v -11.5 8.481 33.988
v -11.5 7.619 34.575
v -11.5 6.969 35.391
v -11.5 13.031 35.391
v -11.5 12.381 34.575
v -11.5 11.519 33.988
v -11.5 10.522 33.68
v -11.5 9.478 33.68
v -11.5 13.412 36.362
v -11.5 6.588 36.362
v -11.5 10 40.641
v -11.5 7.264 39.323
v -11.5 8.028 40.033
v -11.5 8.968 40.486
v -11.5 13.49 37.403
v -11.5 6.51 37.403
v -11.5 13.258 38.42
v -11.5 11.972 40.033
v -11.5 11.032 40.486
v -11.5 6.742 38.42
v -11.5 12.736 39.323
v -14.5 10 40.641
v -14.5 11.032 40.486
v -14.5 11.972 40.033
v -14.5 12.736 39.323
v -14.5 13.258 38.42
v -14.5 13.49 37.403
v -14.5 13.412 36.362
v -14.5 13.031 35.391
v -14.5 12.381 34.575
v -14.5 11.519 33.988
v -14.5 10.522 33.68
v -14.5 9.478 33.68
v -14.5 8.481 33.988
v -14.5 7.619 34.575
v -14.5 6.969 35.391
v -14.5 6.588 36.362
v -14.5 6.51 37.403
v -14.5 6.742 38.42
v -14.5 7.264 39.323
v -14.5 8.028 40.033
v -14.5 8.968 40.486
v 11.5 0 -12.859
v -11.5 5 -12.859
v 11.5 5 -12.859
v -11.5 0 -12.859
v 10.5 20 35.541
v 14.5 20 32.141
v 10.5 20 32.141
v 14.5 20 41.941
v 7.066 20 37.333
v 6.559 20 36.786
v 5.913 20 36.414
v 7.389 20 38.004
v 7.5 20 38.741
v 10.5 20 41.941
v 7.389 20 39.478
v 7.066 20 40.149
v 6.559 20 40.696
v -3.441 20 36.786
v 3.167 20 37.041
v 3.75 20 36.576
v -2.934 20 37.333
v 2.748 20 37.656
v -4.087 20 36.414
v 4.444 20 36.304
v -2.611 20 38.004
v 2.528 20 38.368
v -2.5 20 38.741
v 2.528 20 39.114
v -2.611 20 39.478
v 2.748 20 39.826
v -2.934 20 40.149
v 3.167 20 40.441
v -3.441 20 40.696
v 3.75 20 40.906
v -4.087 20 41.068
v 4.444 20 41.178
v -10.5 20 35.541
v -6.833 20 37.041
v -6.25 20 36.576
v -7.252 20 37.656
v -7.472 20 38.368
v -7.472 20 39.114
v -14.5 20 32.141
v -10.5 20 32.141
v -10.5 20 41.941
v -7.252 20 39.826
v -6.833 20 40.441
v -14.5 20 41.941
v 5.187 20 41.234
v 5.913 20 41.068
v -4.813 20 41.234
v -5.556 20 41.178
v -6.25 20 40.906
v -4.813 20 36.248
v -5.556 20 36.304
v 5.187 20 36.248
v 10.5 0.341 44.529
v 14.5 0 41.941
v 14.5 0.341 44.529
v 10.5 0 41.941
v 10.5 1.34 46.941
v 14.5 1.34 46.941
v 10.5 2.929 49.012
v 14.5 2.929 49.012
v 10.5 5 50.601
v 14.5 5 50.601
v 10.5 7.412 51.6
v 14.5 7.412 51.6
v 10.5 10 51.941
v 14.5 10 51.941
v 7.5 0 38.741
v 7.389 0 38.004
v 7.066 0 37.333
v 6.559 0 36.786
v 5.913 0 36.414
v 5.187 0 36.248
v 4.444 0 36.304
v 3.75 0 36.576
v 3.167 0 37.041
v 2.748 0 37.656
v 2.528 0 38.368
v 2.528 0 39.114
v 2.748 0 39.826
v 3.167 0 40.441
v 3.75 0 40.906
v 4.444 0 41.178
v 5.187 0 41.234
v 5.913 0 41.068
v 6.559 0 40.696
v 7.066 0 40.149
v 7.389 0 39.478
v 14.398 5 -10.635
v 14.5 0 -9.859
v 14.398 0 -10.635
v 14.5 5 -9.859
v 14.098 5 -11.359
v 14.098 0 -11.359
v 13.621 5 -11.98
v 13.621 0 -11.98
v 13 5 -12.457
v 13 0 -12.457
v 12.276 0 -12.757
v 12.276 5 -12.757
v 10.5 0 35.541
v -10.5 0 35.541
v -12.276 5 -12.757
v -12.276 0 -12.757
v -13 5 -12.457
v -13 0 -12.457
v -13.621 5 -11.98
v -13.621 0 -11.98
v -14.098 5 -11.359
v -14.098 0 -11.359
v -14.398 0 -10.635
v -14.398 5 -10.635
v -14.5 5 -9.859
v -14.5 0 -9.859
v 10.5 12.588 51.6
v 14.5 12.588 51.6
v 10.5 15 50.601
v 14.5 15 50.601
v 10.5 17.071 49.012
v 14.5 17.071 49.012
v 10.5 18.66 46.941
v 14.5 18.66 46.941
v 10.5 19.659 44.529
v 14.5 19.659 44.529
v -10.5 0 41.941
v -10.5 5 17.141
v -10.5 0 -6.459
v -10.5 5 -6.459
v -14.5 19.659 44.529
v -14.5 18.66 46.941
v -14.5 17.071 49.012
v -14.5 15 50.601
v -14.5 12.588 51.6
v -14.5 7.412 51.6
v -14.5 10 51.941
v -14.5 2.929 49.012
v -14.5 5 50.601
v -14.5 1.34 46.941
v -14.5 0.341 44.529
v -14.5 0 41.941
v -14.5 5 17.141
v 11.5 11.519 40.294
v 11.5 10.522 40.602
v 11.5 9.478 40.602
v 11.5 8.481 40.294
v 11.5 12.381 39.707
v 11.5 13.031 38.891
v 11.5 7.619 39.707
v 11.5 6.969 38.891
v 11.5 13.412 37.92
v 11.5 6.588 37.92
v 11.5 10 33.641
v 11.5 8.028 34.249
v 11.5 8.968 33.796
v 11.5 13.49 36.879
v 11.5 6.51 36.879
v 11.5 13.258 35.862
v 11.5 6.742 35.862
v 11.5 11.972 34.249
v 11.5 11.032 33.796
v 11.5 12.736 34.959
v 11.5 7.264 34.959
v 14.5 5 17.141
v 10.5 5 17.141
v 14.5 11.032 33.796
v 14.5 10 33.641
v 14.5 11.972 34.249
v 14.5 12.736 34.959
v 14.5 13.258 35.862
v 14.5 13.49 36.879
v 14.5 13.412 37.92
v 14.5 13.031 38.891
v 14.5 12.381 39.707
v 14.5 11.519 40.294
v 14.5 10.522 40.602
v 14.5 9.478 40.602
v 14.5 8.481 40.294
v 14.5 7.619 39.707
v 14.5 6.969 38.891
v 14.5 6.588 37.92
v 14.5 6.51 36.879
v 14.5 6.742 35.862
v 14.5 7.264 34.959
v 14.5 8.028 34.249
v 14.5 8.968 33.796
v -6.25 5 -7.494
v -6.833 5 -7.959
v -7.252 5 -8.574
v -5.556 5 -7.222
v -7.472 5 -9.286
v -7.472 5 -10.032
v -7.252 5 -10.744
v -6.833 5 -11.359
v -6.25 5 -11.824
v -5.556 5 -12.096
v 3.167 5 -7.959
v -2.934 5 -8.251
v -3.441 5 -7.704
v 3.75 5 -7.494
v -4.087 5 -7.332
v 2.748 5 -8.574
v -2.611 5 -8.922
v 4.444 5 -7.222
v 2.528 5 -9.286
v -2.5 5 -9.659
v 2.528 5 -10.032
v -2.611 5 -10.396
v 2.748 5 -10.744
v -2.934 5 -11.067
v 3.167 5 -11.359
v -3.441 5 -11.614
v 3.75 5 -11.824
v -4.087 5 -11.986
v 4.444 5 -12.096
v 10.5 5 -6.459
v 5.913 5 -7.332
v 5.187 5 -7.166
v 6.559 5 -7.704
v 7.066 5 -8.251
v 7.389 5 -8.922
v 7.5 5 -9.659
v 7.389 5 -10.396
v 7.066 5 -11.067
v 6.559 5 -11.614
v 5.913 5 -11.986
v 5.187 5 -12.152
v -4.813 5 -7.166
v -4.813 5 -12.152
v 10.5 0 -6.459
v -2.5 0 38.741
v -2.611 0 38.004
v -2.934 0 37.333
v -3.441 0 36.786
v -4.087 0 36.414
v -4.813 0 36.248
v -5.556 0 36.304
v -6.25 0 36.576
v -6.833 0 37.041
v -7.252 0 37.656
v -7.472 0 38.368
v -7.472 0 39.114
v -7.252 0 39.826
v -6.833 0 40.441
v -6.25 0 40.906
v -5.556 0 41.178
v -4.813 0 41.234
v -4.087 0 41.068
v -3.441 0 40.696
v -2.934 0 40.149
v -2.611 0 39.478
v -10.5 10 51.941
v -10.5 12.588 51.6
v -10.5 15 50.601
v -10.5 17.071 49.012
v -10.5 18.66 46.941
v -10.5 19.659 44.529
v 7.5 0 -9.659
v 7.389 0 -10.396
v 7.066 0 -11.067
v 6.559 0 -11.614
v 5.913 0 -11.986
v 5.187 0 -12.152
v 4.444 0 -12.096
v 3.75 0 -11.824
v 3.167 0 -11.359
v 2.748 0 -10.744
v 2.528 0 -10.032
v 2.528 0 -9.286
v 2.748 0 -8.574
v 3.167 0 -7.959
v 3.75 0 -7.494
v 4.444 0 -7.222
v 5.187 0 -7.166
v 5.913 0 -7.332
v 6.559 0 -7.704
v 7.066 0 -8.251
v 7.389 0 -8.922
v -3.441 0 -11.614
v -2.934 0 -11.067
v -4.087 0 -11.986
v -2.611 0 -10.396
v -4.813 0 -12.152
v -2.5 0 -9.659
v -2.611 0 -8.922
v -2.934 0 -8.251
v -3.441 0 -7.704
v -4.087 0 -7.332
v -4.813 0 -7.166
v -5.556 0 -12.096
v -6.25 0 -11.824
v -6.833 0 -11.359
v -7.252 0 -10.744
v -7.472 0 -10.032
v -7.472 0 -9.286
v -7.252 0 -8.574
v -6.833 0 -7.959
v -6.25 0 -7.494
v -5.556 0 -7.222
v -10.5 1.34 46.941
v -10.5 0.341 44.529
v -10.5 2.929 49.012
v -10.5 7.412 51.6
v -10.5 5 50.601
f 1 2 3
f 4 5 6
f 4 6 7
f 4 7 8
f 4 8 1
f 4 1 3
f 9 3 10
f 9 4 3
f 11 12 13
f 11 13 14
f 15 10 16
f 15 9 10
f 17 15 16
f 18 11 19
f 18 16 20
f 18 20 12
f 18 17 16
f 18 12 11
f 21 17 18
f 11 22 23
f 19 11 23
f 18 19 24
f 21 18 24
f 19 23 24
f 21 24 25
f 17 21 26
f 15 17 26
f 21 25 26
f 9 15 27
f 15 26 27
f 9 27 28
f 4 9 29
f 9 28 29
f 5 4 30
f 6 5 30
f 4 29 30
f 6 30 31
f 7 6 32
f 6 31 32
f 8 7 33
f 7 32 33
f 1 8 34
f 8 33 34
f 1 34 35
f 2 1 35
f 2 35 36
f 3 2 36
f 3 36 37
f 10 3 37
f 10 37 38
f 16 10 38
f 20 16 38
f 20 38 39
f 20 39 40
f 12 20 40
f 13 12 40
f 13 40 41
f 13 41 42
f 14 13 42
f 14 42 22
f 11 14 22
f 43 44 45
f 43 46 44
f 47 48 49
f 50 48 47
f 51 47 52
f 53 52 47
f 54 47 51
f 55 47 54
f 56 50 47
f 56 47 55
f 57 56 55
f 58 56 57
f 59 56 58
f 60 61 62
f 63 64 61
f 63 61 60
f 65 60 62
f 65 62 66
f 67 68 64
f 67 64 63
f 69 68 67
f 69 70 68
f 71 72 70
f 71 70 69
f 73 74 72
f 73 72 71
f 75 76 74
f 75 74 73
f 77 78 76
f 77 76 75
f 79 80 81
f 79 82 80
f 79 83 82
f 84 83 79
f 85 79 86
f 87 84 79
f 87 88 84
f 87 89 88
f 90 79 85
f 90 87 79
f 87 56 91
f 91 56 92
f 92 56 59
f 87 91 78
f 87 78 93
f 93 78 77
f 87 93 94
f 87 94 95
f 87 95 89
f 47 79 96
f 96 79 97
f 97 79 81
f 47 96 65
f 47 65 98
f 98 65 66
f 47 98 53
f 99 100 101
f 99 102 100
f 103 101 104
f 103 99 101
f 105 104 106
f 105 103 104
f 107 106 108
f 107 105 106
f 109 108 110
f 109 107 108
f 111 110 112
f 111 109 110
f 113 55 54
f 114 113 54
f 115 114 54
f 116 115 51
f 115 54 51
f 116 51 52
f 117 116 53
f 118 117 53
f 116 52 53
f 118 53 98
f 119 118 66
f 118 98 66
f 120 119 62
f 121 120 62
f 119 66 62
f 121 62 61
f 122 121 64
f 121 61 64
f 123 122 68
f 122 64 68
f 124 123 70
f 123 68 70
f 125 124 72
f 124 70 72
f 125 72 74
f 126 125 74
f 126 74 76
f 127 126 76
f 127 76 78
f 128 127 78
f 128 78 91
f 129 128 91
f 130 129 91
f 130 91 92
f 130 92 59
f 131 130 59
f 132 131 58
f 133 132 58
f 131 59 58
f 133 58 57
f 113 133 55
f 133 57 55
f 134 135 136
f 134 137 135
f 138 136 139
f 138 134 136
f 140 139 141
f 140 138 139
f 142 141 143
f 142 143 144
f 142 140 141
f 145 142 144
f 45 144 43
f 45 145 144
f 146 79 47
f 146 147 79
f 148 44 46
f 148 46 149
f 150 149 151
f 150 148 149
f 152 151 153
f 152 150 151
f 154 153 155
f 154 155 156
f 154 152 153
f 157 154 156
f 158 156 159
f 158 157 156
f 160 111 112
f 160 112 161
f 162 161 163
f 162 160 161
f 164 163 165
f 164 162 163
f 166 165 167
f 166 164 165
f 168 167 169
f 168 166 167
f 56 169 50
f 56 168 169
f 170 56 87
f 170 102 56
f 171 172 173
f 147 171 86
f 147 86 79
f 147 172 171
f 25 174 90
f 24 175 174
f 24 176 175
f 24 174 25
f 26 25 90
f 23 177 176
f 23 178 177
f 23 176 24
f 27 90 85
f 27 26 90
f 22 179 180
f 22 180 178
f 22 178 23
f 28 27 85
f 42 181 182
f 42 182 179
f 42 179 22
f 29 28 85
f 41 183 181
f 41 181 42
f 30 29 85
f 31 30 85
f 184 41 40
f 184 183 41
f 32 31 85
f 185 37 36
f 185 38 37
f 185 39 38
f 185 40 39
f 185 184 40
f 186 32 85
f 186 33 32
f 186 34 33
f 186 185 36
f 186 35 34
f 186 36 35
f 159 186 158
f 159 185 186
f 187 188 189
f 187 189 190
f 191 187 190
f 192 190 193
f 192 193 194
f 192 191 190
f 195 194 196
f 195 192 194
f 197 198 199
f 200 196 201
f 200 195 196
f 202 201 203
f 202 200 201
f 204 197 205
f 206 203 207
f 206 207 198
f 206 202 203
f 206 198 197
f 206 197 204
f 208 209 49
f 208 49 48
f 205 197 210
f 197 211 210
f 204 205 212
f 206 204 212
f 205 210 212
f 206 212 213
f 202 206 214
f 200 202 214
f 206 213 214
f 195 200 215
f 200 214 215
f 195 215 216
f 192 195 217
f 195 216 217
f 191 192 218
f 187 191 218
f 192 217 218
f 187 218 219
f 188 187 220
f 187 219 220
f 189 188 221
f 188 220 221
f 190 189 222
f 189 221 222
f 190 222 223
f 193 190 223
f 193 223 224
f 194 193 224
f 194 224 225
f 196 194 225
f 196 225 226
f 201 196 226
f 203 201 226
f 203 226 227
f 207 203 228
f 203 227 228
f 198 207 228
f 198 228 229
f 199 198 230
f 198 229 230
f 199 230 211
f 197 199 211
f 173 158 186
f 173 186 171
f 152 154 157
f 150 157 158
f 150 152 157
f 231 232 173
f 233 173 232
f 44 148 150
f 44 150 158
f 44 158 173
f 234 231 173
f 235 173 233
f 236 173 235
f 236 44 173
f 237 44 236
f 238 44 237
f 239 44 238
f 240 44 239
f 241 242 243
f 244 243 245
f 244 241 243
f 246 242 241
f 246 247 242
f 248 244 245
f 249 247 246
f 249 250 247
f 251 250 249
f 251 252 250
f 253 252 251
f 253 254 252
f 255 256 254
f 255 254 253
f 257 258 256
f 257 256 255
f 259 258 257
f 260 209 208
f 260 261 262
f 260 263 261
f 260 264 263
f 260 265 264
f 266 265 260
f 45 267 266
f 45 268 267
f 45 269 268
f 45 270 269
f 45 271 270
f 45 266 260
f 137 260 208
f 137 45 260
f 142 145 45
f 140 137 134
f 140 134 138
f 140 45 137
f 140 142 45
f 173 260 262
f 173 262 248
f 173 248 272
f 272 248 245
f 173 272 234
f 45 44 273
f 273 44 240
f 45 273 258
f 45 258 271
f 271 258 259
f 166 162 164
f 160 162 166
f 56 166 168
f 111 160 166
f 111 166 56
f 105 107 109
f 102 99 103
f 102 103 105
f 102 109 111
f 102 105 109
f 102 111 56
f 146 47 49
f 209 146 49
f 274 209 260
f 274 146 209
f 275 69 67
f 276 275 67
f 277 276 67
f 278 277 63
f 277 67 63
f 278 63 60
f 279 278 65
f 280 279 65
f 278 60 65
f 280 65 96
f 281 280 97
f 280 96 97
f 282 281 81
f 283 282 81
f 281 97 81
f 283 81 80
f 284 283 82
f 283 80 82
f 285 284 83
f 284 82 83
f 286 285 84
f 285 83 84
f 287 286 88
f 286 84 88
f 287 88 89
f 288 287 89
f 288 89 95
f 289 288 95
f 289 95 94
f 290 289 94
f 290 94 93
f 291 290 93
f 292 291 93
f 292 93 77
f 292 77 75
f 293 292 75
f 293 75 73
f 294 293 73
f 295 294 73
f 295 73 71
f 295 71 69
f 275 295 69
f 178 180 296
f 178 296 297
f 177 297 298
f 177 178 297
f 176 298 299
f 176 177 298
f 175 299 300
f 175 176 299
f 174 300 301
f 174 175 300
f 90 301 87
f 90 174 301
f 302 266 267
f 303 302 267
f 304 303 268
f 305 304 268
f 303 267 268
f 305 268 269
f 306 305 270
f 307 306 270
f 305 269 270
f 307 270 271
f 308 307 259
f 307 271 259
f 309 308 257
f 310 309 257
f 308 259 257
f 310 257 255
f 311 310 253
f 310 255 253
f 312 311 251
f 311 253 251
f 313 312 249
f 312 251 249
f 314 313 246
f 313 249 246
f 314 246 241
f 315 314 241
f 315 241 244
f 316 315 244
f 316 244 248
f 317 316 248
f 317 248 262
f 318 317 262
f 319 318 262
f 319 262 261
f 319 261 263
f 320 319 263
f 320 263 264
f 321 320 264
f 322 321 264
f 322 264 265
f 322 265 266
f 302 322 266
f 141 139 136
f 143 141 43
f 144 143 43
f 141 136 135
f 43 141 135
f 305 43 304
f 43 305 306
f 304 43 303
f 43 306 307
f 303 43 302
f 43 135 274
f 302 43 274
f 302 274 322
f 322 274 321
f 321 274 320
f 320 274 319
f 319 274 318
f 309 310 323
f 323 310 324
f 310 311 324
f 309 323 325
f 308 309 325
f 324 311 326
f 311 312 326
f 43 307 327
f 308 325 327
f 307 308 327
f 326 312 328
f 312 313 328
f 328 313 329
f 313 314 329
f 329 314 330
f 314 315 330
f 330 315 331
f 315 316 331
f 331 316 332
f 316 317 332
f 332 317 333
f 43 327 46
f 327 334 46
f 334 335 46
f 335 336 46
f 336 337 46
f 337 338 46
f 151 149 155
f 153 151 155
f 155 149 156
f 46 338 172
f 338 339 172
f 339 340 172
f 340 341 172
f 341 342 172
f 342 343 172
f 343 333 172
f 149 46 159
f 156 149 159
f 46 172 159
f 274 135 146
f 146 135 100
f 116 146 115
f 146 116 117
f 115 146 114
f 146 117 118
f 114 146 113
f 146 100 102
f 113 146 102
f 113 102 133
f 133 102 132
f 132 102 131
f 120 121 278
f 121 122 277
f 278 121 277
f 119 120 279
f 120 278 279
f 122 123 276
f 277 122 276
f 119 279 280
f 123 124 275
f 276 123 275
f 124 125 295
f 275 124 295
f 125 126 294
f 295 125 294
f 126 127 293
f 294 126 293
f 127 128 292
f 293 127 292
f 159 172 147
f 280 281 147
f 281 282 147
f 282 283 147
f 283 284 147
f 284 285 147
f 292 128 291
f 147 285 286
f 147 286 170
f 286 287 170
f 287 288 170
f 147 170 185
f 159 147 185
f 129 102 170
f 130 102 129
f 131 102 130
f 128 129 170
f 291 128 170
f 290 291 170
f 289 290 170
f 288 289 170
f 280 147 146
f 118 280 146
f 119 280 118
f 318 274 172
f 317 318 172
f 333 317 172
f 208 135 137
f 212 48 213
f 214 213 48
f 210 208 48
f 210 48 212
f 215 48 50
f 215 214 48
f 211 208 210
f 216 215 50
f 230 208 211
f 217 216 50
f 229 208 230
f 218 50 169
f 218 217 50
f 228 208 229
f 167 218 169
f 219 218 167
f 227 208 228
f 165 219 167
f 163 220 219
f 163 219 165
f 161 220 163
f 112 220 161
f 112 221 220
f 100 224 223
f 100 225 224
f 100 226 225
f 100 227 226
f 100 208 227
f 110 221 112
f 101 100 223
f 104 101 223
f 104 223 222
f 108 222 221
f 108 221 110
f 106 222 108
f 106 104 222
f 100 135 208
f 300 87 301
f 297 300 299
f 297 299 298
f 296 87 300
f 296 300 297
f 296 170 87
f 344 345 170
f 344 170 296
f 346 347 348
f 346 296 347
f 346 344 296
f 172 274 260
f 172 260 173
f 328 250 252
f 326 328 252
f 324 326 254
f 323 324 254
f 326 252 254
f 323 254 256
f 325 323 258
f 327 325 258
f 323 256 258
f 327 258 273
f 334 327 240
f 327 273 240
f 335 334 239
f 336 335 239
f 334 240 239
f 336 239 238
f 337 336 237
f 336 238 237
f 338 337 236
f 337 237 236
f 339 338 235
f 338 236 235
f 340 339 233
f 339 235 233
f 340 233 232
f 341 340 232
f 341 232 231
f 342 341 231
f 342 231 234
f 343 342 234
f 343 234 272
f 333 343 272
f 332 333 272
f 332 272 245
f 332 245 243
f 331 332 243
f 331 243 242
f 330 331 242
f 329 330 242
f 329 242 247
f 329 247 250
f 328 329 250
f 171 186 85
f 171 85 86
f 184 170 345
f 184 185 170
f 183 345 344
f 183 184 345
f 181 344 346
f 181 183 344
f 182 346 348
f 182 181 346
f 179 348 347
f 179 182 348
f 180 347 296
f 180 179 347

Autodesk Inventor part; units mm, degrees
ref_plane "YZ Plane" through (0, 0, 0) normal (1, 0, 0) x (0, 1, 0)
ref_plane "XZ Plane" through (0, 0, 0) normal (0, 1, 0) x (-1, 0, 0)
ref_plane "XY Plane" through (0, 0, 0) normal (0, 0, 1) x (1, 0, 0)
sketch "Esquisse1" plane through (0, 0, 0) normal (0, 1, 0) x (-1, 0, 0)
  line L0 (-14.5, 51.941) -> (-10.5, 51.941)
  line L1 (-10.5, 51.941) -> (-10.5, -12.859)
  line L2 (-10.5, -12.859) -> (-14.5, -12.859)
  line L3 (-14.5, -12.859) -> (-14.5, 51.941)
  line L4 (10.5, 51.941) -> (14.5, 51.941)
  line L5 (14.5, 51.941) -> (14.5, -12.859)
  line L6 (14.5, -12.859) -> (10.5, -12.859)
  line L7 (10.5, -12.859) -> (10.5, 51.941)
  line L8 (-10.5, -6.459) -> (10.5, -6.459)
  line L9 (10.5, -6.459) -> (10.5, -12.859)
  line L10 (10.5, -12.859) -> (-10.5, -12.859)
  line L11 (-10.5, -12.859) -> (-10.5, -6.459)
  line L12 (-10.5, 41.941) -> (10.5, 41.941)
  line L13 (10.5, 41.941) -> (10.5, 35.541)
  line L14 (10.5, 35.541) -> (-10.5, 35.541)
  line L15 (-10.5, 35.541) -> (-10.5, 41.941)
  line L16 (10.5, -12.859) -> (14.5, -12.859)
  point P0 (0, 0)
  dimension "d1" = 6.4
  dimension "d2" = 21
  dimension "d3" = 4
  dimension "d4" = 4
  dimension "d5" = 10.5
  dimension "d6" = 42
  dimension "d7" = 10
  dimension "d8" = 35.541
  dimension "d9" = 6.4
extrude "Extrusion1" add sketch "Esquisse1" along normal blind 20 contours L0 L1 L2 L3 | L12 L7 L14 L1 | L1 L8 L7 L10 | L7 L4 L5 L6
sketch "Esquisse2" plane through (14.5, 0, 51.941) normal (1, 0, 0) x (0, 0, -1)
  line L0 (64.8, 0) -> (64.8, 20) projected
  line L1 (0, 0) -> (0, 20) projected
  line L2 (0, 10) -> (64.8, 10) construction
  circle A0 centre (14.8, 10) radius 3.5
  point P0 (51.941, 0)
  dimension "d12" = 50
  dimension "d13" = 7
extrude "Extrusion2" cut sketch "Esquisse2" against normal blind 3
sketch "Esquisse3" plane through (-14.5, 0, -12.859) normal (-1, 0, 0) x (0, 0, 1)
  line L0 (64.8, 0) -> (64.8, 20) projected
  line L1 (0, 0) -> (0, 20) projected
  line L2 (64.8, 10) -> (0, 10) construction
  circle A0 centre (50, 10) radius 3.5
  point P0 (12.859, 0)
  dimension "d16" = 50
  dimension "d17" = 7
extrude "Extrusion3" cut sketch "Esquisse3" against normal blind 3
sketch "Esquisse5" plane through (0, 20, 0) normal (0, 1, 0) x (1, 0, 0)
  line L0 (10.5, -35.541) -> (-10.5, -35.541) projected
  line L1 (14.5, 12.859) -> (-14.5, 12.859) projected
  line L2 (-10.5, -41.941) -> (10.5, -41.941) projected
  line L3 (-9.9, 12.859) -> (9.9, 12.859)
  line L4 (9.9, 12.859) -> (9.9, 6.459)
  line L5 (9.9, 6.459) -> (-9.9, 6.459)
  line L6 (-9.9, 6.459) -> (-9.9, 12.859)
  line L7 (-9.9, -41.941) -> (9.9, -41.941)
  line L8 (9.9, -41.941) -> (9.9, -35.541)
  line L9 (9.9, -35.541) -> (-9.9, -35.541)
  line L10 (-9.9, -35.541) -> (-9.9, -41.941)
  line L11 (0, 12.859) -> (0, -41.941)
  circle A0 centre (5, 9.659) radius 2.5
  circle A1 centre (5, -38.741) radius 2.5
  circle A2 centre (-5, 9.659) radius 2.5
  circle A3 centre (-5, -38.741) radius 2.5
  point P0 (0, 0)
  dimension "d29" = 6.4
  dimension "d30" = 6.4
  dimension "d31" = 19.8
  dimension "d32" = 9.9
  dimension "d33" = 5
  dimension "d34" = 5
  dimension "d35" = 5
  dimension "d36" = 5
  dimension "d37" = 3.2
  dimension "d38" = 3.2
extrude "Extrusion5" cut sketch "Esquisse5" against normal through all contours A0 | A1 | A2 | A3
sketch "Esquisse6" plane through (0, 20, 0) normal (0, 1, 0) x (1, 0, 0)
  circle A0 centre (-5, 9.659) radius 2.5 projected
  circle A1 centre (5, 9.659) radius 2.5 projected
  line L0 (14.5, -51.941) -> (14.5, 12.859) projected
  line L1 (-14.5, 12.859) -> (14.5, 12.859)
  line L2 (14.5, 12.859) -> (14.5, -17.141)
  line L3 (14.5, -17.141) -> (-14.5, -17.141)
  line L4 (-14.5, -17.141) -> (-14.5, 12.859)
  point P0 (0, 0)
  dimension "d41" = 30
extrude "Extrusion6" cut sketch "Esquisse6" against normal blind 15
chamfer "Chanfrein1" distance 15 angle 45 2 edges at (12.5, 20, 17.141) (-12.5, 20, 17.141)
fillet "Congé1" radius 3 2 edges at (-14.5, 2.5, -12.859) (14.5, 2.5, -12.859)
fillet "Congé2" radius 10 4 edges at (-12.5, 0, 51.941) (12.5, 0, 51.941) (-12.5, 20, 51.941) (12.5, 20, 51.941)
equation "\"d4\" = d3"
equation "\"d5\" = 0.5 * d2"
equation "\"d9\" = d1"
equation "\"d30\" = d29"
equation "\"d32\" = 0.5 * d31"
equation "\"d34\" = d33"
equation "\"d38\" = d37"
properties part number "new_shoulder_modified"
